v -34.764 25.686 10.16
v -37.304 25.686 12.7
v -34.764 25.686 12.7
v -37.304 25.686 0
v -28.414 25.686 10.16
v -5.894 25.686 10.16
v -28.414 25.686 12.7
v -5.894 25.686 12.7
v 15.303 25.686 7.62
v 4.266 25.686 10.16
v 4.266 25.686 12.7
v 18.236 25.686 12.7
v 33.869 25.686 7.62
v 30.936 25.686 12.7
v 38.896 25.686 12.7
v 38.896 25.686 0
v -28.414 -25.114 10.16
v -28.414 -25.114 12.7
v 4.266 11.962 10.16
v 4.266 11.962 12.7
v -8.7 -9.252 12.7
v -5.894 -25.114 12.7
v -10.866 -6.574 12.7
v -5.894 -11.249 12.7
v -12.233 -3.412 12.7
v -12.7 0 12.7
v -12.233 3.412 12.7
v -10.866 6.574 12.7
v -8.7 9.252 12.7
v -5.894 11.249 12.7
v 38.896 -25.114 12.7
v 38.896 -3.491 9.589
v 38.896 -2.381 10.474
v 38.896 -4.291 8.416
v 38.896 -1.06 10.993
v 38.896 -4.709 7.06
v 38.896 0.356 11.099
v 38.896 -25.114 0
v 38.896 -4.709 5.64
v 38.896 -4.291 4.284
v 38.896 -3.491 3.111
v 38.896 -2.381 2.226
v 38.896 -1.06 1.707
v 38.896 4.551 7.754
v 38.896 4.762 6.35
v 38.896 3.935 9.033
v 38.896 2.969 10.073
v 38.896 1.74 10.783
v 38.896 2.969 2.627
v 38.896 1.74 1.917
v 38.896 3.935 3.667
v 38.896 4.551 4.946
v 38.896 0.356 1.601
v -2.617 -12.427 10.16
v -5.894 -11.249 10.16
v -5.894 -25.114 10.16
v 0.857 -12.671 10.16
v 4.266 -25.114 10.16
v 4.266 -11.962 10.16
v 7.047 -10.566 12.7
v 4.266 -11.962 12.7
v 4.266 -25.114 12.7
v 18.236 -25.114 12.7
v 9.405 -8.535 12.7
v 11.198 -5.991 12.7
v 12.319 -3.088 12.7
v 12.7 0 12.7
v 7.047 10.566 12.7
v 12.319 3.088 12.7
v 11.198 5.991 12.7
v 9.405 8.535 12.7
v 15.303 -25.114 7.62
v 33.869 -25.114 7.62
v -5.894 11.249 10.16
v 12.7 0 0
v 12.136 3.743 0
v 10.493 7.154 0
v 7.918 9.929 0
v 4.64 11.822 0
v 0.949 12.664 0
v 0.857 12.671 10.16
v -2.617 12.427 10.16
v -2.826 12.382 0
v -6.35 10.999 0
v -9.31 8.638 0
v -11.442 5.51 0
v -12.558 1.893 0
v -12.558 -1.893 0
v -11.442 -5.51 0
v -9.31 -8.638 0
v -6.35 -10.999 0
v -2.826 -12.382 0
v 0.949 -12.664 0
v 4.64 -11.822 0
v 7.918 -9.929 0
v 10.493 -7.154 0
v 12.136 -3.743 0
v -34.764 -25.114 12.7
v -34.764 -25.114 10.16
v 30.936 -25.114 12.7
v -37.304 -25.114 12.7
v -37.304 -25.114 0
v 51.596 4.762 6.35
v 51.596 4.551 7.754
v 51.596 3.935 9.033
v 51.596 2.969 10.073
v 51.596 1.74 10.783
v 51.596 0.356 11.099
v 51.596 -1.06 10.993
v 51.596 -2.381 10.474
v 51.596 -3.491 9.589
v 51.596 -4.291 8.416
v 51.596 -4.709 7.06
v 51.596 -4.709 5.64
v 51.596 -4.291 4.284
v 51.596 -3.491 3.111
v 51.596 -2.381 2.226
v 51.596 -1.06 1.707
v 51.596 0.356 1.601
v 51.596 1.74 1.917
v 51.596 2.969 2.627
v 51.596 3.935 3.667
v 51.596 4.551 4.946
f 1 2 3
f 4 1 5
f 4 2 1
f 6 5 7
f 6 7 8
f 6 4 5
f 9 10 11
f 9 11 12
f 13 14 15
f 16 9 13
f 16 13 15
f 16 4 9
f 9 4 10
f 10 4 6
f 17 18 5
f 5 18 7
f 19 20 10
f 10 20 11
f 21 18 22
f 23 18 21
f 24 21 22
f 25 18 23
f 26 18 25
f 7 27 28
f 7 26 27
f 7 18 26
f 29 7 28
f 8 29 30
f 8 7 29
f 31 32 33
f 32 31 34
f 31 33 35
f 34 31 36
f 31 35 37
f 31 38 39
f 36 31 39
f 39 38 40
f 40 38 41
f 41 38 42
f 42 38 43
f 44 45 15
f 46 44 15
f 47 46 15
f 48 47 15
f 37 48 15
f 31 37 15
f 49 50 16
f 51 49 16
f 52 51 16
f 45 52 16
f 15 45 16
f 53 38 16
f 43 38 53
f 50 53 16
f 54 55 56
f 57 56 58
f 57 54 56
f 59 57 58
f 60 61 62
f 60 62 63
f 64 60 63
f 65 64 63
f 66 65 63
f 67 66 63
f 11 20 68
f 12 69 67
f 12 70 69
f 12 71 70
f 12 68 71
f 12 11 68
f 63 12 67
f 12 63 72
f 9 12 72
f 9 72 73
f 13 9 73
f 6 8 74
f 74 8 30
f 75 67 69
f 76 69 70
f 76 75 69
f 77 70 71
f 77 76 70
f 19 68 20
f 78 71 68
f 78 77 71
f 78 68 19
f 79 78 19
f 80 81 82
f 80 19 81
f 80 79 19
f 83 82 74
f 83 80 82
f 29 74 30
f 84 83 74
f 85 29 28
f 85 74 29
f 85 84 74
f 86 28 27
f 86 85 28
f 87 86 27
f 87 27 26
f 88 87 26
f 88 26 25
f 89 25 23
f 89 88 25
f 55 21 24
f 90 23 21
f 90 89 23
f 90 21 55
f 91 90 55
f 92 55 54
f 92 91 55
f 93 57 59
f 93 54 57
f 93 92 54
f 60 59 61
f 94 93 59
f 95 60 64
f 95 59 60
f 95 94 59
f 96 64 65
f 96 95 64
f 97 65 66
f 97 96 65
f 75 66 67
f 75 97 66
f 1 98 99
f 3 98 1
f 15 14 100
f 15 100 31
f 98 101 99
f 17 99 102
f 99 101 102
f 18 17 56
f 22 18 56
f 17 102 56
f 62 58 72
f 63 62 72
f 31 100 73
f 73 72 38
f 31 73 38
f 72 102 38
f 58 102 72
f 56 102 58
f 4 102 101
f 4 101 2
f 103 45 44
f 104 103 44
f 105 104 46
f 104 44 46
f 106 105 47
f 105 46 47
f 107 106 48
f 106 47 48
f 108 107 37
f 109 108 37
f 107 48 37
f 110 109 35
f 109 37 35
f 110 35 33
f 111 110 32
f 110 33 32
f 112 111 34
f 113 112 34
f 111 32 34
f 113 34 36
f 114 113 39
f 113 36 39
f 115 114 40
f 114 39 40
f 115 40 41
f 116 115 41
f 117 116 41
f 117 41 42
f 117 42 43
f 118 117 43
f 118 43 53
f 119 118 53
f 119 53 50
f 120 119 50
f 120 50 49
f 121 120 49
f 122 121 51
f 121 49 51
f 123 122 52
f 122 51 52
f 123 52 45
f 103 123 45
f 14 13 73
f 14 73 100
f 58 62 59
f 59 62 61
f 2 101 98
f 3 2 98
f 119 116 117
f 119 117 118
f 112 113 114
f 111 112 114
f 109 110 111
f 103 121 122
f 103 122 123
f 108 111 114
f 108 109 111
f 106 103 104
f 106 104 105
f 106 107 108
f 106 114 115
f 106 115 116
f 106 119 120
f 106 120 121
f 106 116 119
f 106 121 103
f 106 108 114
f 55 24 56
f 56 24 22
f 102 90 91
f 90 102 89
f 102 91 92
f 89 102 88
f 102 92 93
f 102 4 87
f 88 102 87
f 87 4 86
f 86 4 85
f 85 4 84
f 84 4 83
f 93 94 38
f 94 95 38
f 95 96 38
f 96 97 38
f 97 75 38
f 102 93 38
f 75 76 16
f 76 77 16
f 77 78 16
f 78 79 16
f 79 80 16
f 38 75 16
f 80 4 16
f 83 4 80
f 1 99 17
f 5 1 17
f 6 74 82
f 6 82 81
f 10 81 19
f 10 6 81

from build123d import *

# Parameters (mm, degrees)
F0_W     = 76.2
F0_H     = 50.8
F0_R     = 12.7
F1_DEPTH = 12.7
F2_W     = 6.35
F2_H     = 50.8
F3_DEPTH = 2.54
F5_DEPTH = 50.801
F6_R     = 4.7625
F7_DEPTH = 12.7


with BuildPart() as f1:
    # F0 (on Top) → F1 (new body)
    with BuildSketch(Plane.XY):
        with Locations((0.796007, 0.286434)):
            Rectangle(F0_W, F0_H)
        Circle(F0_R, mode=Mode.SUBTRACT)
    extrude(amount=F1_DEPTH)

    # F2 (on face) → F3 (cut)
    with BuildSketch(Plane.XY.offset(12.7)):
        with Locations((-31.588993, 0.286434)):
            Rectangle(F2_W, F2_H)
        with BuildLine():
            Line((-5.894164, -11.249392), (-5.894164, -25.113566))
            Line((-5.894164, -25.113566), (4.265836, -25.113566))
            Line((4.265836, -25.113566), (4.265836, -11.962134))
            ThreePointArc((4.265836, -11.962134), (-0.888743, -12.668865), (-5.894164, -11.249392))
        make_face()
        with BuildLine():
            Line((4.265836, 25.686434), (-5.894164, 25.686434))
            Line((-5.894164, 25.686434), (-5.894164, 11.249392))
            ThreePointArc((-5.894164, 11.249392), (-0.888743, 12.668865), (4.265836, 11.962134))
            Line((4.265836, 11.962134), (4.265836, 25.686434))
        make_face()
    extrude(amount=-F3_DEPTH, mode=Mode.SUBTRACT)

    # F4 (on face) → F5 (cut, through all)
    with BuildSketch(Plane.XZ.offset(25.113566)):
        Polygon((30.935836, 12.7), (18.235836, 12.7), (15.302896, 7.62), (33.868775, 7.62), align=None)
    extrude(amount=-F5_DEPTH, mode=Mode.SUBTRACT)

    # F6 (on face) → F7 (join)
    with BuildSketch(Plane.YZ.offset(38.896007)):
        with Locations((0, 6.35)):
            Circle(F6_R)
    extrude(amount=F7_DEPTH)


solid = f1.part
